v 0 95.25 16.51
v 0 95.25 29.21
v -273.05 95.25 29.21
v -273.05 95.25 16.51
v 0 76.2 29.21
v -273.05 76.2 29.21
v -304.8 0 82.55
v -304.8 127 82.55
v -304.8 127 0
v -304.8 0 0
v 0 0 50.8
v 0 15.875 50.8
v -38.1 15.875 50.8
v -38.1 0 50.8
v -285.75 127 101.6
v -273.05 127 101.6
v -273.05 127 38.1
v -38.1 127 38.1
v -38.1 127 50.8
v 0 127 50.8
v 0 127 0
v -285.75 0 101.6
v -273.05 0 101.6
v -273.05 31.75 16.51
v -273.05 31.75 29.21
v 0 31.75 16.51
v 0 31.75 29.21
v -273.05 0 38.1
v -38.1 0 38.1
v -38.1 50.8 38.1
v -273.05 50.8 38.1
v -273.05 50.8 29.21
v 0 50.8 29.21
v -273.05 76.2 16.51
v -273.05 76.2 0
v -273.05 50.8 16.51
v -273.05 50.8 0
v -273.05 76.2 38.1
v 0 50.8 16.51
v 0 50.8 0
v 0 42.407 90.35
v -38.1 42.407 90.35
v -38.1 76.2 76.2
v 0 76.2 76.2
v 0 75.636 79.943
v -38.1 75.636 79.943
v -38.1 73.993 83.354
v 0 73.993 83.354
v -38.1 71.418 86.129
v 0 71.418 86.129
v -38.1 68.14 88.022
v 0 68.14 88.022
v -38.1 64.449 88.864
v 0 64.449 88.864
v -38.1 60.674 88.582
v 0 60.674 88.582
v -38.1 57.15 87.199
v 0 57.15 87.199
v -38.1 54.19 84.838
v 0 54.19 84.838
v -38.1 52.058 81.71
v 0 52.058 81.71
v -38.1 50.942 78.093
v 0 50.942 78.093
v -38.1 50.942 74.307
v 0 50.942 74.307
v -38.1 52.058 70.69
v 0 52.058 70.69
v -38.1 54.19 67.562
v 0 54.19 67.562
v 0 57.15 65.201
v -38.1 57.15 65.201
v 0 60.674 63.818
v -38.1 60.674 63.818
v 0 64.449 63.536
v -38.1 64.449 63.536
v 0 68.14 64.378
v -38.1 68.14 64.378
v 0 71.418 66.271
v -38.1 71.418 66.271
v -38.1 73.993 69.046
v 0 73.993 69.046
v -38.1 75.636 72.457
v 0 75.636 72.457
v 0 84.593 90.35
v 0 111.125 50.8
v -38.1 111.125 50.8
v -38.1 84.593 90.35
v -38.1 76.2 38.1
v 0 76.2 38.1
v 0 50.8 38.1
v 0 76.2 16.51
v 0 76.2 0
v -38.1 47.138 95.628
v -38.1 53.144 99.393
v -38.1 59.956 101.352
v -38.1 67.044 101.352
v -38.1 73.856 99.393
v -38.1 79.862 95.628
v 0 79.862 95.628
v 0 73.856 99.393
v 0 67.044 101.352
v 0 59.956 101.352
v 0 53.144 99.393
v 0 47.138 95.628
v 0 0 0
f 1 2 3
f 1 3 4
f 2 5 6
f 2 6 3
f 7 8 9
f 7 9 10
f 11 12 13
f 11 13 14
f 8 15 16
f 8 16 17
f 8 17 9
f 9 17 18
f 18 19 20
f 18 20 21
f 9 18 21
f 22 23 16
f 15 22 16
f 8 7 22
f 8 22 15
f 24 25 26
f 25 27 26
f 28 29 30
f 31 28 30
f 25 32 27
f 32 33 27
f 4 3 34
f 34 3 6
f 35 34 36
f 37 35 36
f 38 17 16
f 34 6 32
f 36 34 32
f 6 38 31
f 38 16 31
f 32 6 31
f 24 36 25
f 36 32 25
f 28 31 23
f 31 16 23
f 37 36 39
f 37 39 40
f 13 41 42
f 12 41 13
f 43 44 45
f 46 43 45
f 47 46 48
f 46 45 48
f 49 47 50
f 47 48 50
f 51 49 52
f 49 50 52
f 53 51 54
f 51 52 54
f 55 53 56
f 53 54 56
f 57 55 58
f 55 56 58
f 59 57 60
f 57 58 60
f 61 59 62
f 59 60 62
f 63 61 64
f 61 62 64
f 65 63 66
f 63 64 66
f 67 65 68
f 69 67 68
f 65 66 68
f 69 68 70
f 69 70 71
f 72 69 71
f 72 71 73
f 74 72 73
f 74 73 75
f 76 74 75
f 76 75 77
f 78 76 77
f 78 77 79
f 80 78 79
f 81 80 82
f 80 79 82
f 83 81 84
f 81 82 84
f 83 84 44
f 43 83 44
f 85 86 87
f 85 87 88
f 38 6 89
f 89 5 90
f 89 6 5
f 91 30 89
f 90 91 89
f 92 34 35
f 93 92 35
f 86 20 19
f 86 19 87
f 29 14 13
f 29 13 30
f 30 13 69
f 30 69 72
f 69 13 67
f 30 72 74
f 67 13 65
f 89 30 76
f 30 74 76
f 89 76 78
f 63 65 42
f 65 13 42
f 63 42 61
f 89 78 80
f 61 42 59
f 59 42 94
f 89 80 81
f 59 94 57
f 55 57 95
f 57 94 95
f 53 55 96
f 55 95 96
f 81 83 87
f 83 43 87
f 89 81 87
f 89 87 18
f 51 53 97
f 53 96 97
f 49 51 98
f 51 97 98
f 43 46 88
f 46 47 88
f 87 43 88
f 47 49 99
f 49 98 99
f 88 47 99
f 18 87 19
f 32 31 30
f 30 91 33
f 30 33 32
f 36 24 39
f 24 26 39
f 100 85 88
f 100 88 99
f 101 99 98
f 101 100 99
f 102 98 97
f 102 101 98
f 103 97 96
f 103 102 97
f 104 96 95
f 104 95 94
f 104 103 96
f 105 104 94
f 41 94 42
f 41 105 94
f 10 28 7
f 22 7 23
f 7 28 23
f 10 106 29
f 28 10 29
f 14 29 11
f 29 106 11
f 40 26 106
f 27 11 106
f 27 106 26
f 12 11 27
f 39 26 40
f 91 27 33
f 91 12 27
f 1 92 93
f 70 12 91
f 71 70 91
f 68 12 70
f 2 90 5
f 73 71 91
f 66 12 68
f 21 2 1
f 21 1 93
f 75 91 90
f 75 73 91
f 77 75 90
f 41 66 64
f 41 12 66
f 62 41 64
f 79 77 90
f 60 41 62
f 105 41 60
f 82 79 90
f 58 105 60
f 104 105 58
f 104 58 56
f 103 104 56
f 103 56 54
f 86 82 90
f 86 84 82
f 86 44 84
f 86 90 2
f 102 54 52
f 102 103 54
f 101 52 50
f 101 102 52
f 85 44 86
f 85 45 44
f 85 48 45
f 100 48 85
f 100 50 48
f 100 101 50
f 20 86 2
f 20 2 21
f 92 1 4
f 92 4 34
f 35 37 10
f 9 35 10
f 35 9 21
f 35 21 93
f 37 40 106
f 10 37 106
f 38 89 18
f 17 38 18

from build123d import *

# Parameters (mm, degrees)
F0_R     = 12.7
F1_DEPTH = 38.1
F3_DEPTH = 234.95
F5_DEPTH = 31.75
F6_SIZE  = 19.05


with BuildPart() as f1:
    # F0 (on Right) → F1 (new body)
    with BuildSketch(Plane.YZ):
        Polygon((0, 38.1), (0, 0), (50.8, 0), (50.8, 16.51), (31.75, 16.51), (31.75, 29.21), (50.8, 29.21), (50.8, 38.1), align=None)
        with BuildLine():
            Line((0, 50.8), (0, 38.1))
            Line((0, 38.1), (50.8, 38.1))
            Line((50.8, 38.1), (76.2, 38.1))
            Line((76.2, 38.1), (127, 38.1))
            Line((127, 38.1), (127, 50.8))
            Line((127, 50.8), (111.125, 50.8))
            Line((111.125, 50.8), (84.5934256055, 90.3501730104))
            ThreePointArc((84.5934256055, 90.3501730104), (63.5, 101.6), (42.4065743945, 90.3501730104))
            Line((42.4065743945, 90.3501730104), (15.875, 50.8))
            Line((15.875, 50.8), (0, 50.8))
        make_face()
        with Locations((63.5, 76.2)):
            Circle(F0_R, mode=Mode.SUBTRACT)
        Polygon((127, 38.1), (76.2, 38.1), (76.2, 29.21), (95.25, 29.21), (95.25, 16.51), (76.2, 16.51), (76.2, 0), (127, 0), align=None)
    extrude(amount=-F1_DEPTH)

    # F2 (on face) → F3 (join)
    with BuildSketch(Plane(origin=(-38.1, 0, 0), x_dir=(0, -1, 0), z_dir=(-1, 0, 0))):
        Polygon((0, 38.1), (-50.8, 38.1), (-50.8, 29.21), (-31.75, 29.21), (-31.75, 16.51), (-50.8, 16.51), (-50.8, 0), (0, 0), align=None)
        Polygon((-76.2, 38.1), (-127, 38.1), (-127, 0), (-76.2, 0), (-76.2, 16.51), (-95.25, 16.51), (-95.25, 29.21), (-76.2, 29.21), align=None)
    extrude(amount=F3_DEPTH)

    # F4 (on face) → F5 (join)
    with BuildSketch(Plane(origin=(-273.05, 0, 0), x_dir=(0, -1, 0), z_dir=(-1, 0, 0))):
        Polygon((-76.2, 16.51), (-76.2, 0), (0, 0), (0, 101.6), (-127, 101.6), (-127, 38.1), (-76.2, 38.1), (-76.2, 29.21), (-95.25, 29.21), (-95.25, 16.51), align=None)
        Polygon((-127, 38.1), (-127, 0), (-76.2, 0), (-76.2, 16.51), (-95.25, 16.51), (-95.25, 29.21), (-76.2, 29.21), (-76.2, 38.1), align=None)
    extrude(amount=F5_DEPTH)

    # F6
    f6_edges = [f1.edges().sort_by_distance(p)[0] for p in [
        (-304.8, 63.5, 101.6),
    ]]
    chamfer(f6_edges, length=F6_SIZE)


solid = f1.part
